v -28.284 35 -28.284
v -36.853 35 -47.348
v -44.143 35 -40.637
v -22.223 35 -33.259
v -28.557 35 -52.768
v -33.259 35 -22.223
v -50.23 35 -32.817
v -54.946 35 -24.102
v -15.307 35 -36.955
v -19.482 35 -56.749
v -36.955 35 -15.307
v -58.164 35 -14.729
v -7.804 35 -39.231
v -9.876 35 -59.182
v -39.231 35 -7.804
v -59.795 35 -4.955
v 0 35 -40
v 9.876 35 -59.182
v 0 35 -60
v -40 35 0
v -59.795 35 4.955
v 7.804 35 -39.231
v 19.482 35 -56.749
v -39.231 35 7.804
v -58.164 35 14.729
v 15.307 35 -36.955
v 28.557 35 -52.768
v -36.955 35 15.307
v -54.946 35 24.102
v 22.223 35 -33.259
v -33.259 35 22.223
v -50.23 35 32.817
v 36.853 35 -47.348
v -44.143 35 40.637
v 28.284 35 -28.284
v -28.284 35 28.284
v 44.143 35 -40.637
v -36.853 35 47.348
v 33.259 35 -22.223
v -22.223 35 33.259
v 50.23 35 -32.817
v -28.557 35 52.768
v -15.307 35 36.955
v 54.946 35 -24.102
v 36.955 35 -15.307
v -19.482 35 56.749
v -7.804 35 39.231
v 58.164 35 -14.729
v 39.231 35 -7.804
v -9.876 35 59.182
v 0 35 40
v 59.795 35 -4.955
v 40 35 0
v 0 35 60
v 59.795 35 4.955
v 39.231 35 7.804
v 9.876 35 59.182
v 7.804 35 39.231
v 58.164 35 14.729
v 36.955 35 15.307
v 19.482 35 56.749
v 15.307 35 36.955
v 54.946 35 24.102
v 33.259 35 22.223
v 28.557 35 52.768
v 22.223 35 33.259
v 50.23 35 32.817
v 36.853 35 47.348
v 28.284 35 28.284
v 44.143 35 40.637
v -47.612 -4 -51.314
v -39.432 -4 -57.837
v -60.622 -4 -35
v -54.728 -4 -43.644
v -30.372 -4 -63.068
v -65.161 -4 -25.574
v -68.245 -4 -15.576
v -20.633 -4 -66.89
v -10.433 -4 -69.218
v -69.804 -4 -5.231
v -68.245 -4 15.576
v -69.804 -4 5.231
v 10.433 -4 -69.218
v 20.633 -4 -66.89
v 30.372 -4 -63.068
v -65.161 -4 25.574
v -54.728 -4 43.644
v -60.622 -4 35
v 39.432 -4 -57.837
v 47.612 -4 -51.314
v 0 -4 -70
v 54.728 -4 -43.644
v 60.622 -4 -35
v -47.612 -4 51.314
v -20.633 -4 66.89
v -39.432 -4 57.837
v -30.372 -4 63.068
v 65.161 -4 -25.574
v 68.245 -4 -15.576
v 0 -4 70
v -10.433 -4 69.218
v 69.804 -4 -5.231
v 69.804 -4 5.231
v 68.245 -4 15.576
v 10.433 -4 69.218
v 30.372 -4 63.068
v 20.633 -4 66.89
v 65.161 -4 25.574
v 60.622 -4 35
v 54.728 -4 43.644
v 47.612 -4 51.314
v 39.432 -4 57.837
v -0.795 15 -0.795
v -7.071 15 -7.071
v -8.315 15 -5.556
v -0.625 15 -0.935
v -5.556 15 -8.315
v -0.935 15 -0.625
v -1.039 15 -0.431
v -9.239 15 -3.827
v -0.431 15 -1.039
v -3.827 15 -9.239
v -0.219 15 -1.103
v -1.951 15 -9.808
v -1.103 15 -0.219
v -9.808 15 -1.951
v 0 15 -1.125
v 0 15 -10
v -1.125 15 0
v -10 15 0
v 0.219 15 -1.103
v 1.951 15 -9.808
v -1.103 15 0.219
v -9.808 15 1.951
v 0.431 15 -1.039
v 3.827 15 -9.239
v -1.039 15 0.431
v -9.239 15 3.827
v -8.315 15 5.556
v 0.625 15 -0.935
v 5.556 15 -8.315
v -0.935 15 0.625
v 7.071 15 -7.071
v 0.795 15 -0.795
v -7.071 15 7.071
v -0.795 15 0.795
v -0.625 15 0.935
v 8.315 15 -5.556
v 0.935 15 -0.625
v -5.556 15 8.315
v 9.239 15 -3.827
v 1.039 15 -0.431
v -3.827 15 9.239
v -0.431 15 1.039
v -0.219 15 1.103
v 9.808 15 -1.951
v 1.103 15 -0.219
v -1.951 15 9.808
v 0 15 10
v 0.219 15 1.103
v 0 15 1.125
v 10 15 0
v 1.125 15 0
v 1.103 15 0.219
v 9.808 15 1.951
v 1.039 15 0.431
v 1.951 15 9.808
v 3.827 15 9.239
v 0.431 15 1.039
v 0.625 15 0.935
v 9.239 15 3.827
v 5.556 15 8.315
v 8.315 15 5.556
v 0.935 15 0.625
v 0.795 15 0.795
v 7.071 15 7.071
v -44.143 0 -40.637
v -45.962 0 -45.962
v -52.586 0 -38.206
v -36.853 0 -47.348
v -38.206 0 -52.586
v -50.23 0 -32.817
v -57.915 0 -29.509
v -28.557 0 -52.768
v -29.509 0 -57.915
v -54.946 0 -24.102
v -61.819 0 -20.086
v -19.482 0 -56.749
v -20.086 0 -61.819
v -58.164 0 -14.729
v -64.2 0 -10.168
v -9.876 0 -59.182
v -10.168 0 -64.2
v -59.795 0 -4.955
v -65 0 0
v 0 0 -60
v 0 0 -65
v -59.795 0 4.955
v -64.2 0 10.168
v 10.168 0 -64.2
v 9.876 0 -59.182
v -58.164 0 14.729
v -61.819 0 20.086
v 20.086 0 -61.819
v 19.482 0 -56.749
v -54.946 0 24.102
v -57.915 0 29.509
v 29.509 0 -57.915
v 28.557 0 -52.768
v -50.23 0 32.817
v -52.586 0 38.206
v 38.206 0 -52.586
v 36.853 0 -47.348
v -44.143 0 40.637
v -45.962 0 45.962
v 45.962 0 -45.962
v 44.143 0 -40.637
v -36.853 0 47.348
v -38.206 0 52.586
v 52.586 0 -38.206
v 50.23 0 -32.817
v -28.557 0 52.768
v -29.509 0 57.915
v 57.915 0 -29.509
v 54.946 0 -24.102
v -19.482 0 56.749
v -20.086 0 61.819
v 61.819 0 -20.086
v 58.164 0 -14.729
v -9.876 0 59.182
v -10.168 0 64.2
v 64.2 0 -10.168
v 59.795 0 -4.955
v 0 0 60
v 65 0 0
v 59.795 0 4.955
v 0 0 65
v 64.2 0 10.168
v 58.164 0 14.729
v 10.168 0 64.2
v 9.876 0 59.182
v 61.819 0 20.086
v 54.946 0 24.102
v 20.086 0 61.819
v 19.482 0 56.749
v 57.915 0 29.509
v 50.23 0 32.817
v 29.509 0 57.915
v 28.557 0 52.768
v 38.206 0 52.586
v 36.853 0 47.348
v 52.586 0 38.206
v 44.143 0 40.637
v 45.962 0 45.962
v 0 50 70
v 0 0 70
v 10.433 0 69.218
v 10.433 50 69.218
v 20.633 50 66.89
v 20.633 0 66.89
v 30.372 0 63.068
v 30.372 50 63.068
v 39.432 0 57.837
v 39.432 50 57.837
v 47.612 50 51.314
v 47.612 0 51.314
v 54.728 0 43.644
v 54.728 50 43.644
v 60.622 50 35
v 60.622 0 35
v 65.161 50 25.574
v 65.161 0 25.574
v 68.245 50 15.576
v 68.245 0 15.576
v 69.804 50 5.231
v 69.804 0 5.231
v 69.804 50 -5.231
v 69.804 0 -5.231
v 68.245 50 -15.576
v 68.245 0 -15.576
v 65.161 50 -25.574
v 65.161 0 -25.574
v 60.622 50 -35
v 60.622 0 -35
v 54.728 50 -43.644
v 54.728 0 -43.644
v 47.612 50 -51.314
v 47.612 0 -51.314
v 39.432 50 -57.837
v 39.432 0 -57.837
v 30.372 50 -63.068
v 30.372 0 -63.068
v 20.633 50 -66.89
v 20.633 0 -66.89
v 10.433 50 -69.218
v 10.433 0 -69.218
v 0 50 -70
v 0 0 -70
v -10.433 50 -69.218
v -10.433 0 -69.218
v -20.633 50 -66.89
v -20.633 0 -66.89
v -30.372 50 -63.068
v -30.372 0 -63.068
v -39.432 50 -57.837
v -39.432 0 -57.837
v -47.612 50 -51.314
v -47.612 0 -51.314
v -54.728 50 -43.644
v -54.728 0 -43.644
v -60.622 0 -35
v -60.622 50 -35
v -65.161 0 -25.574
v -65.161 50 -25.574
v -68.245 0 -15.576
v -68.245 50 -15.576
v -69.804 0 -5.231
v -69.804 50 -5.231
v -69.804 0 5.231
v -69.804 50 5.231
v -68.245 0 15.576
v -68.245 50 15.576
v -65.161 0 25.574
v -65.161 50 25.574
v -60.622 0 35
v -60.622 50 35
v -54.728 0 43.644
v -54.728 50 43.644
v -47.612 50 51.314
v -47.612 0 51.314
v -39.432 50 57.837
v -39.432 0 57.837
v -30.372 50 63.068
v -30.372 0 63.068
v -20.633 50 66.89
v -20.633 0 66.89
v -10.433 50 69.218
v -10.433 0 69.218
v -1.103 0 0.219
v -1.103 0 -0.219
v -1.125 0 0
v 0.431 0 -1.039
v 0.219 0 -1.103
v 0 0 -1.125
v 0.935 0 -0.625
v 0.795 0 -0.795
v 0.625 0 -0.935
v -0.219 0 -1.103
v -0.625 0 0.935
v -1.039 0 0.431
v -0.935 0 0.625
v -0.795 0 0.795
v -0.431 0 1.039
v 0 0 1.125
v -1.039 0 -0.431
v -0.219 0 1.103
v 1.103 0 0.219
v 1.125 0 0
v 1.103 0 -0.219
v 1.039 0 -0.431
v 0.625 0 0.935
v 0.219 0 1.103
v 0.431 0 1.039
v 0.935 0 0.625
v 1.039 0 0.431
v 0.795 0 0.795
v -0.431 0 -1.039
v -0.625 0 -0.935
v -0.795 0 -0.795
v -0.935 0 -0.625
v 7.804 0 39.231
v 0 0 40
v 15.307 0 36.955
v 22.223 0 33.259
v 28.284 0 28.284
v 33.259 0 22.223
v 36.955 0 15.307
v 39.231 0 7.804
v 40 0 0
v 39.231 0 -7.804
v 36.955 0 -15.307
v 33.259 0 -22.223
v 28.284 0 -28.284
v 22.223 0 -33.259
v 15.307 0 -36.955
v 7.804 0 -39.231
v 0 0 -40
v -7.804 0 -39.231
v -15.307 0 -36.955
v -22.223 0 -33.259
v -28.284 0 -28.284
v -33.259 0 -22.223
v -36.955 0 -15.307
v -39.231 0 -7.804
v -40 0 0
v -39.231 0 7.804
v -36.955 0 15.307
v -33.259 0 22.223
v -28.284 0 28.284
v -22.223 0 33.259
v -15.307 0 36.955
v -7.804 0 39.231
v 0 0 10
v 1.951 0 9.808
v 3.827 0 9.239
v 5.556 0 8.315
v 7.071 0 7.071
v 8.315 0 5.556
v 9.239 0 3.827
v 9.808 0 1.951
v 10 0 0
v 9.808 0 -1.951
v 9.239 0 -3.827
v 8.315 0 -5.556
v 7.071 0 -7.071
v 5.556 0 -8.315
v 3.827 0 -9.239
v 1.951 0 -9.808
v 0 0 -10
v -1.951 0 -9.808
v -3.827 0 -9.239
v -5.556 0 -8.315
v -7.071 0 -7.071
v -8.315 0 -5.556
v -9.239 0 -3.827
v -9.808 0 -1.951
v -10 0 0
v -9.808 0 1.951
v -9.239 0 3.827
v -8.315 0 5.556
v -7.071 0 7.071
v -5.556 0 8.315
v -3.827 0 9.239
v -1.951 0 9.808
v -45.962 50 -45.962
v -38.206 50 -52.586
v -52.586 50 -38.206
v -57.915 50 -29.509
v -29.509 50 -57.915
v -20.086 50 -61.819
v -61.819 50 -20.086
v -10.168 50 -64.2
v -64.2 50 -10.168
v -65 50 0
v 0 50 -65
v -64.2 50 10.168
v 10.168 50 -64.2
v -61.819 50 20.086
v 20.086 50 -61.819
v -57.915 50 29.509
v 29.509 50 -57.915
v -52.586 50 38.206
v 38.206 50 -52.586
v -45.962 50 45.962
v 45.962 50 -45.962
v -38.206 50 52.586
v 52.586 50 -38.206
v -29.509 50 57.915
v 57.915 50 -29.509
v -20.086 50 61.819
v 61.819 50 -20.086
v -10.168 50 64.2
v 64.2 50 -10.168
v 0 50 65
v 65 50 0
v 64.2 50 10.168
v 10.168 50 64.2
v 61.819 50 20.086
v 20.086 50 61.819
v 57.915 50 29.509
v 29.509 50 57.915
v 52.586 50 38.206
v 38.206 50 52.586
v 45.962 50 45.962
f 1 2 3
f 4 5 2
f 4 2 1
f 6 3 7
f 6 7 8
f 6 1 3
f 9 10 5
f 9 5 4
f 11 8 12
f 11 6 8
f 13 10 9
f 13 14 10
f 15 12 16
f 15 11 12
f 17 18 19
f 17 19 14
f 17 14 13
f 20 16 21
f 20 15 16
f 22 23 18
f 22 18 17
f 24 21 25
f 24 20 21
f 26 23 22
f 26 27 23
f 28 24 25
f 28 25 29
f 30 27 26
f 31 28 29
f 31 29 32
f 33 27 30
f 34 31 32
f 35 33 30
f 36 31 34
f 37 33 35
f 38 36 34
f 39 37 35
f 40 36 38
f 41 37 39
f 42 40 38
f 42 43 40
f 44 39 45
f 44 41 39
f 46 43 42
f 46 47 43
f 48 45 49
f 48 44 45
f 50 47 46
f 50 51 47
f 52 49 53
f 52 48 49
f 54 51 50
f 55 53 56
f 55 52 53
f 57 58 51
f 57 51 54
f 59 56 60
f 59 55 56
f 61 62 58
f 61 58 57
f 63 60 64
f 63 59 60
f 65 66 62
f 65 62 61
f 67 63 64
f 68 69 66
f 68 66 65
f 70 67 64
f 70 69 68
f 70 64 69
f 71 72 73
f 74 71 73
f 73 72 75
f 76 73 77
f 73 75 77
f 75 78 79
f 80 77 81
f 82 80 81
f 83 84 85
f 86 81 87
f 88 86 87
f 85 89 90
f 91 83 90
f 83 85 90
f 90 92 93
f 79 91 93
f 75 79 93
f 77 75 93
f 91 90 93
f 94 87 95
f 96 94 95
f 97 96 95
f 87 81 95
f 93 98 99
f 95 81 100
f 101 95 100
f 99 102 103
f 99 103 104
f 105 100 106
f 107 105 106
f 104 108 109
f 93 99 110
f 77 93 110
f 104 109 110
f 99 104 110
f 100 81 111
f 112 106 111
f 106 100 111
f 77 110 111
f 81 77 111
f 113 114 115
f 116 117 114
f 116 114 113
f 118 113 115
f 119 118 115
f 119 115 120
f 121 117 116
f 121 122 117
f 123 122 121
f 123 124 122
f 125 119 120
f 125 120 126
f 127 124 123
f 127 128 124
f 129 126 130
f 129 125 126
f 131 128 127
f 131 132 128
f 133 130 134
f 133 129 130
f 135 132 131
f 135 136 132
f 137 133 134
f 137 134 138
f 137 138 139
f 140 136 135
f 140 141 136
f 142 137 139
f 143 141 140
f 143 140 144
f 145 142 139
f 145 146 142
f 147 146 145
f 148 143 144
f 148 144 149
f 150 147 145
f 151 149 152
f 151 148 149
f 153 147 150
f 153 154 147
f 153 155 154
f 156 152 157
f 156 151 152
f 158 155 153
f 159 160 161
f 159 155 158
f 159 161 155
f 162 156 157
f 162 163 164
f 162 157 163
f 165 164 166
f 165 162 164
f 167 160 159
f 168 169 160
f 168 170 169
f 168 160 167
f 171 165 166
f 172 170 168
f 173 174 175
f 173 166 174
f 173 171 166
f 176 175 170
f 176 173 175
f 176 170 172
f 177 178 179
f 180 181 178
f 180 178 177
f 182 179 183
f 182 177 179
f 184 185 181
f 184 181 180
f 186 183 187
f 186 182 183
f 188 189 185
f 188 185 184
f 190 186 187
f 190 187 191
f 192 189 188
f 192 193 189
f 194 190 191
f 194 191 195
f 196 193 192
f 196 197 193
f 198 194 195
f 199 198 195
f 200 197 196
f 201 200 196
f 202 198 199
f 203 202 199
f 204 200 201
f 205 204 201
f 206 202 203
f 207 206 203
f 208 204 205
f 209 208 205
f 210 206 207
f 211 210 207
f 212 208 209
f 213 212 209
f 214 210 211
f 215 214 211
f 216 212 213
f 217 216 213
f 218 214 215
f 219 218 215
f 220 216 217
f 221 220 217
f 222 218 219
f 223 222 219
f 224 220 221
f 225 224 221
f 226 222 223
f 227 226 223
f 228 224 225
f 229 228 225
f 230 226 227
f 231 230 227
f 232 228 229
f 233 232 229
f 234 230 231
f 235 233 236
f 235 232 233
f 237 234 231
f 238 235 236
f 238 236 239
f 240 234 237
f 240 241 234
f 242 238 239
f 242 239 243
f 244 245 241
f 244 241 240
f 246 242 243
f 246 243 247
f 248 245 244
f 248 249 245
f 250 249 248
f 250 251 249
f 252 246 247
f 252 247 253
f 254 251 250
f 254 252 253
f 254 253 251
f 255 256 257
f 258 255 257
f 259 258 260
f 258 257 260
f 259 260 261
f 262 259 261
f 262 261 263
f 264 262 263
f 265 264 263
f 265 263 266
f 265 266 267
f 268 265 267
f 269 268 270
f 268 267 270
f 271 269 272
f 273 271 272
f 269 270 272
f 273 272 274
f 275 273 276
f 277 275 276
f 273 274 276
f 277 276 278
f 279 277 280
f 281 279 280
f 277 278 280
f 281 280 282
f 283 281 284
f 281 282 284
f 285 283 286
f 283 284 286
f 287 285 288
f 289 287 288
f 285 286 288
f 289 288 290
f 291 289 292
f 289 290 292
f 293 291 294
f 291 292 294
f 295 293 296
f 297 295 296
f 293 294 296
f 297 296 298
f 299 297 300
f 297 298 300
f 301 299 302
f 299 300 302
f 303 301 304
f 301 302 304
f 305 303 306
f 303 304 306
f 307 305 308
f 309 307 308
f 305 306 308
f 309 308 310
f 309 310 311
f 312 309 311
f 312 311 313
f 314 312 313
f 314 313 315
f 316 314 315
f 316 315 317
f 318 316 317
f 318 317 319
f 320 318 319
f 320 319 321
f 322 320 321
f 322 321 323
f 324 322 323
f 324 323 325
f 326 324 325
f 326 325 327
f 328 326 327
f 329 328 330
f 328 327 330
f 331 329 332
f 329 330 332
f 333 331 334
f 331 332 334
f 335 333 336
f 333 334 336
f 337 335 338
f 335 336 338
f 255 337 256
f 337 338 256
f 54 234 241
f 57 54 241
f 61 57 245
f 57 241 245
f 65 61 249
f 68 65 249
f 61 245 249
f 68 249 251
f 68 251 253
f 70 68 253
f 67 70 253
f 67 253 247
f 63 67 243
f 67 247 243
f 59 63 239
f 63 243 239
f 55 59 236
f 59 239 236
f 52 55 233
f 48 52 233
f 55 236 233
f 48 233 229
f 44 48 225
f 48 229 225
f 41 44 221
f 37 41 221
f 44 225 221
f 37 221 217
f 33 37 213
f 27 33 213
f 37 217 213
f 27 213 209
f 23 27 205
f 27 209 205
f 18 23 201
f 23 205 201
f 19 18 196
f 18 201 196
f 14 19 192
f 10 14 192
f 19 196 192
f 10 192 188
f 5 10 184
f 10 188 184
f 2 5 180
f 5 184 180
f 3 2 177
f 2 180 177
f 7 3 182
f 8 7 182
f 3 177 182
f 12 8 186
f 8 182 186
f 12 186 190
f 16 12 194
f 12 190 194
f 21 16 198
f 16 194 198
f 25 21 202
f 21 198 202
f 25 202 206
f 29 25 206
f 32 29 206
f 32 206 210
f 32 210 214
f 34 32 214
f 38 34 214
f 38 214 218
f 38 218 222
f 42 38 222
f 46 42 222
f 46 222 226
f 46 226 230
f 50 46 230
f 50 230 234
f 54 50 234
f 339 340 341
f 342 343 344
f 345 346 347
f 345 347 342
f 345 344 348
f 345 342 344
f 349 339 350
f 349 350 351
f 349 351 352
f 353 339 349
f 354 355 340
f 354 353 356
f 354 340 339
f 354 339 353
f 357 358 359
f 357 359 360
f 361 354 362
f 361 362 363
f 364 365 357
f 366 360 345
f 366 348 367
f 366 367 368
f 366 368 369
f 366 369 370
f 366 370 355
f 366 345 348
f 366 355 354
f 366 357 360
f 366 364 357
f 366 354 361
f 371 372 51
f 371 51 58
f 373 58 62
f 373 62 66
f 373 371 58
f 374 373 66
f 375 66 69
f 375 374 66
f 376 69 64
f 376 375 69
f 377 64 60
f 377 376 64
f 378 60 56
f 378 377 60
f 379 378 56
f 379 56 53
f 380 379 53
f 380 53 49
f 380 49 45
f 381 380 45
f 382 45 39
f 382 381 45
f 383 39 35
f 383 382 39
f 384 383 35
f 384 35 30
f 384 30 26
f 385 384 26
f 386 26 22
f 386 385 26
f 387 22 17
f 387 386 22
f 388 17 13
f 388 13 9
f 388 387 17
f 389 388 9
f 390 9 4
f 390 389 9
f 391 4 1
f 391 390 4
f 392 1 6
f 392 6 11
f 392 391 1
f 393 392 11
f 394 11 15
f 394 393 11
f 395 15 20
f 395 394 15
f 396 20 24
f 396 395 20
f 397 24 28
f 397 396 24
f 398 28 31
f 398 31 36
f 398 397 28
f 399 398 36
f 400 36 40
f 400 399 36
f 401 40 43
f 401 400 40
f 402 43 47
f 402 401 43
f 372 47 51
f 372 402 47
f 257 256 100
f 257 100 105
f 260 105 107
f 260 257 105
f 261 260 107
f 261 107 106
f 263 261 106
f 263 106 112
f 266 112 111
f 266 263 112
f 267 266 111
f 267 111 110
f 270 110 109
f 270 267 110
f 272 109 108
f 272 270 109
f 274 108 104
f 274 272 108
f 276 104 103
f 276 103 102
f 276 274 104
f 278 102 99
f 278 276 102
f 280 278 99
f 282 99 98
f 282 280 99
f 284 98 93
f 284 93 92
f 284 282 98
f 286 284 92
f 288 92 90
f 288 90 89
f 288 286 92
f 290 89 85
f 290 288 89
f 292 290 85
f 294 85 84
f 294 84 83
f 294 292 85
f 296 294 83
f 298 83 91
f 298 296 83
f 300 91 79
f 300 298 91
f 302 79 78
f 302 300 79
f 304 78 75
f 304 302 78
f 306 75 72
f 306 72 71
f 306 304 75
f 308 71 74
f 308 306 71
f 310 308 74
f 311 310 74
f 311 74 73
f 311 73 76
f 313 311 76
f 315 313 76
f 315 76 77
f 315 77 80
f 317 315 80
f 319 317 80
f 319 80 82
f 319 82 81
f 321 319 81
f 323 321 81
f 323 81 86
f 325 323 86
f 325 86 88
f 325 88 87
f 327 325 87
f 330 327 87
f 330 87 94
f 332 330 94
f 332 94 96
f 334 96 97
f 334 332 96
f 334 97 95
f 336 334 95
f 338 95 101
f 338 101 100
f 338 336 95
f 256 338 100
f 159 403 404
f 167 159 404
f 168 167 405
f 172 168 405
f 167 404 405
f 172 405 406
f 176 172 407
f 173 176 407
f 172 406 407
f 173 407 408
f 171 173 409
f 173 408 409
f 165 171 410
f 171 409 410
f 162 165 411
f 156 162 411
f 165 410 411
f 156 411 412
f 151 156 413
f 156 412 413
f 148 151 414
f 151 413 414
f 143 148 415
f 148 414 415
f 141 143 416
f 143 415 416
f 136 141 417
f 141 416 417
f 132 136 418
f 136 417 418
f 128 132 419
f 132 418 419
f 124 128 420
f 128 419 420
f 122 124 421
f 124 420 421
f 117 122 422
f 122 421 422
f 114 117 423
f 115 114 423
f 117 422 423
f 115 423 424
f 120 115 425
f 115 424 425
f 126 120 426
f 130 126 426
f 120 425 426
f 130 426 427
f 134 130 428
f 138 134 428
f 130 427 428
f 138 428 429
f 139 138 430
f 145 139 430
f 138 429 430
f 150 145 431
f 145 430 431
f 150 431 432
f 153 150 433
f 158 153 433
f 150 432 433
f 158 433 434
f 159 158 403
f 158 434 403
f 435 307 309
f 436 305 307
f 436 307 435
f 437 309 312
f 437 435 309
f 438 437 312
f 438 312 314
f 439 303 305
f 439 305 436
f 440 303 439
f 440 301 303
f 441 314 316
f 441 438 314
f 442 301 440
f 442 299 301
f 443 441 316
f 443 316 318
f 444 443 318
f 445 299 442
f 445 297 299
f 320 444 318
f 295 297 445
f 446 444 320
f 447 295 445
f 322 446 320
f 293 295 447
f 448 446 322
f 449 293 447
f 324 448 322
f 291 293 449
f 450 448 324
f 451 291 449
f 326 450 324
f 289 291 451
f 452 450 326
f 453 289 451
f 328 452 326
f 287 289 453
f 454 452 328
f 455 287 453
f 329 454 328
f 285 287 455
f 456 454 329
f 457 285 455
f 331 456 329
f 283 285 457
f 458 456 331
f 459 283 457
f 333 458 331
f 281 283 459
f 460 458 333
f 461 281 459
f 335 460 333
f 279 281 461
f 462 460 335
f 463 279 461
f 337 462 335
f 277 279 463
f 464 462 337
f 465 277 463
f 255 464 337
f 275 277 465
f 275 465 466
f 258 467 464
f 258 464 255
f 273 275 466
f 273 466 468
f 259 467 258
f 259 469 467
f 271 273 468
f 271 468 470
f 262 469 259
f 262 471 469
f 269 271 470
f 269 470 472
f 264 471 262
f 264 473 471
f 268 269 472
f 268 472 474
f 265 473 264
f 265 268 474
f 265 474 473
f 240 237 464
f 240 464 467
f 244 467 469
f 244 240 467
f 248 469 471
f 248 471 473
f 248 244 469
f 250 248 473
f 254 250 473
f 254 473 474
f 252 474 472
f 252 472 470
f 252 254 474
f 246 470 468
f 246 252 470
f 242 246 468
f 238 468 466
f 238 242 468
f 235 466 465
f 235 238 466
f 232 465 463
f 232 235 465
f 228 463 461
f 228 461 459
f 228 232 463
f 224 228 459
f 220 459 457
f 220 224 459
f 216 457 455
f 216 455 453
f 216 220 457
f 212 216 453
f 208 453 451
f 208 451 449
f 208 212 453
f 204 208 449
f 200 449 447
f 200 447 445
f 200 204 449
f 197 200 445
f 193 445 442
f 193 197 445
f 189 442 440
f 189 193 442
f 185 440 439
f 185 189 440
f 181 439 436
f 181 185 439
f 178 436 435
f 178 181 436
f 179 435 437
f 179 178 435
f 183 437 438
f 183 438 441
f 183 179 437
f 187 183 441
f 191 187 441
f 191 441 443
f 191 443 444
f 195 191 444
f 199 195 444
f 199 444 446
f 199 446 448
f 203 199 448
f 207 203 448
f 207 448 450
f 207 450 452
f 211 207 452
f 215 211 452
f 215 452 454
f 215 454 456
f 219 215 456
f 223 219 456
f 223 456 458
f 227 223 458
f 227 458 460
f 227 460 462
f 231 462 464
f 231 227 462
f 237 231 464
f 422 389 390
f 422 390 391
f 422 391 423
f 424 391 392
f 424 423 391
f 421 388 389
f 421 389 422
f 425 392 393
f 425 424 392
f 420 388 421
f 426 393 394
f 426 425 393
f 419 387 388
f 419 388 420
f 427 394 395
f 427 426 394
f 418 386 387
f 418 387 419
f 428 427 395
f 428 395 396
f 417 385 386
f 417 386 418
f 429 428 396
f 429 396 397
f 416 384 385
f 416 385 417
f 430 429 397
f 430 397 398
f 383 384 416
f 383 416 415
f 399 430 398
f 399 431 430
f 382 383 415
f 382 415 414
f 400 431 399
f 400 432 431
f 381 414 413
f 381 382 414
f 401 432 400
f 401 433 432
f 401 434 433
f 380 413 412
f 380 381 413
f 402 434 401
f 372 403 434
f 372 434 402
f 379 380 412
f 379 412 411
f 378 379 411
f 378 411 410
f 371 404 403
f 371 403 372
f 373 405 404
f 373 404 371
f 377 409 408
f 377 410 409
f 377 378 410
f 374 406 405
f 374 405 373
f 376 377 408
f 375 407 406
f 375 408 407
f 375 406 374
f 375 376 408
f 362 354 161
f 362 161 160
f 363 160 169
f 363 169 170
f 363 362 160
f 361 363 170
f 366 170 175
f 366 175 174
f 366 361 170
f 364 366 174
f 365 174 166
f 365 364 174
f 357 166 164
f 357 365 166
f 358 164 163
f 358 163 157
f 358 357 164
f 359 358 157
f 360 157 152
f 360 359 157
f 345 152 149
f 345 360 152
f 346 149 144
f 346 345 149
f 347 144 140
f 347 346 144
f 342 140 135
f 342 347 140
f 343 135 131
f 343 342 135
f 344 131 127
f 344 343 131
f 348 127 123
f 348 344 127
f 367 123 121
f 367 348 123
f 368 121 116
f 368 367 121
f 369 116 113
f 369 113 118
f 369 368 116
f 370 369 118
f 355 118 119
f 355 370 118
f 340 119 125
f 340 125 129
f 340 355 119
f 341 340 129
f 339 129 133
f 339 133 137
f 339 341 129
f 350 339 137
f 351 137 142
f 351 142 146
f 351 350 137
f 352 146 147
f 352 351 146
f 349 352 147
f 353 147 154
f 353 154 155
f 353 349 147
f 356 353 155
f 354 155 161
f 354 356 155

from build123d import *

# Parameters (mm, degrees)
SKETCH1_R           = 70
BOSS_EXTRUDE2_DEPTH = 4
SKETCH1_6_R         = 10
SKETCH1_6_R_2       = 1.125
BOSS_EXTRUDE3_DEPTH = 15
BOSS_EXTRUDE4_START = 50
SKETCH1_7_R         = 70
SKETCH1_7_R_2       = 65
BOSS_EXTRUDE4_DEPTH = 50
SKETCH1_8_R         = 60
SKETCH1_8_R_2       = 40
BOSS_EXTRUDE5_DEPTH = 35


with BuildPart() as part:
    # Sketch1 → Boss-Extrude2 (new body)
    with BuildSketch(Plane(origin=(0, 0, 0), x_dir=(1, 0, 0), z_dir=(0, 1, 0))):
        Circle(SKETCH1_R)
    extrude(amount=-BOSS_EXTRUDE2_DEPTH)

    # Sketch1<6> → Boss-Extrude3 (add)
    with BuildSketch(Plane(origin=(0, 0, 0), x_dir=(1, 0, 0), z_dir=(0, 1, 0))):
        Circle(SKETCH1_6_R)
        Circle(SKETCH1_6_R_2, mode=Mode.SUBTRACT)
    extrude(amount=BOSS_EXTRUDE3_DEPTH)

    # Sketch1<7> → Boss-Extrude4 (add)
    with BuildSketch(Plane(origin=(0, 0, 0), x_dir=(1, 0, 0), z_dir=(0, 1, 0)).offset(BOSS_EXTRUDE4_START)):
        Circle(SKETCH1_7_R)
        Circle(SKETCH1_7_R_2, mode=Mode.SUBTRACT)
    extrude(amount=-BOSS_EXTRUDE4_DEPTH)

    # Sketch1<8> → Boss-Extrude5 (add)
    with BuildSketch(Plane(origin=(0, 0, 0), x_dir=(1, 0, 0), z_dir=(0, 1, 0))):
        Circle(SKETCH1_8_R)
        Circle(SKETCH1_8_R_2, mode=Mode.SUBTRACT)
    extrude(amount=BOSS_EXTRUDE5_DEPTH)


solid = part.part
